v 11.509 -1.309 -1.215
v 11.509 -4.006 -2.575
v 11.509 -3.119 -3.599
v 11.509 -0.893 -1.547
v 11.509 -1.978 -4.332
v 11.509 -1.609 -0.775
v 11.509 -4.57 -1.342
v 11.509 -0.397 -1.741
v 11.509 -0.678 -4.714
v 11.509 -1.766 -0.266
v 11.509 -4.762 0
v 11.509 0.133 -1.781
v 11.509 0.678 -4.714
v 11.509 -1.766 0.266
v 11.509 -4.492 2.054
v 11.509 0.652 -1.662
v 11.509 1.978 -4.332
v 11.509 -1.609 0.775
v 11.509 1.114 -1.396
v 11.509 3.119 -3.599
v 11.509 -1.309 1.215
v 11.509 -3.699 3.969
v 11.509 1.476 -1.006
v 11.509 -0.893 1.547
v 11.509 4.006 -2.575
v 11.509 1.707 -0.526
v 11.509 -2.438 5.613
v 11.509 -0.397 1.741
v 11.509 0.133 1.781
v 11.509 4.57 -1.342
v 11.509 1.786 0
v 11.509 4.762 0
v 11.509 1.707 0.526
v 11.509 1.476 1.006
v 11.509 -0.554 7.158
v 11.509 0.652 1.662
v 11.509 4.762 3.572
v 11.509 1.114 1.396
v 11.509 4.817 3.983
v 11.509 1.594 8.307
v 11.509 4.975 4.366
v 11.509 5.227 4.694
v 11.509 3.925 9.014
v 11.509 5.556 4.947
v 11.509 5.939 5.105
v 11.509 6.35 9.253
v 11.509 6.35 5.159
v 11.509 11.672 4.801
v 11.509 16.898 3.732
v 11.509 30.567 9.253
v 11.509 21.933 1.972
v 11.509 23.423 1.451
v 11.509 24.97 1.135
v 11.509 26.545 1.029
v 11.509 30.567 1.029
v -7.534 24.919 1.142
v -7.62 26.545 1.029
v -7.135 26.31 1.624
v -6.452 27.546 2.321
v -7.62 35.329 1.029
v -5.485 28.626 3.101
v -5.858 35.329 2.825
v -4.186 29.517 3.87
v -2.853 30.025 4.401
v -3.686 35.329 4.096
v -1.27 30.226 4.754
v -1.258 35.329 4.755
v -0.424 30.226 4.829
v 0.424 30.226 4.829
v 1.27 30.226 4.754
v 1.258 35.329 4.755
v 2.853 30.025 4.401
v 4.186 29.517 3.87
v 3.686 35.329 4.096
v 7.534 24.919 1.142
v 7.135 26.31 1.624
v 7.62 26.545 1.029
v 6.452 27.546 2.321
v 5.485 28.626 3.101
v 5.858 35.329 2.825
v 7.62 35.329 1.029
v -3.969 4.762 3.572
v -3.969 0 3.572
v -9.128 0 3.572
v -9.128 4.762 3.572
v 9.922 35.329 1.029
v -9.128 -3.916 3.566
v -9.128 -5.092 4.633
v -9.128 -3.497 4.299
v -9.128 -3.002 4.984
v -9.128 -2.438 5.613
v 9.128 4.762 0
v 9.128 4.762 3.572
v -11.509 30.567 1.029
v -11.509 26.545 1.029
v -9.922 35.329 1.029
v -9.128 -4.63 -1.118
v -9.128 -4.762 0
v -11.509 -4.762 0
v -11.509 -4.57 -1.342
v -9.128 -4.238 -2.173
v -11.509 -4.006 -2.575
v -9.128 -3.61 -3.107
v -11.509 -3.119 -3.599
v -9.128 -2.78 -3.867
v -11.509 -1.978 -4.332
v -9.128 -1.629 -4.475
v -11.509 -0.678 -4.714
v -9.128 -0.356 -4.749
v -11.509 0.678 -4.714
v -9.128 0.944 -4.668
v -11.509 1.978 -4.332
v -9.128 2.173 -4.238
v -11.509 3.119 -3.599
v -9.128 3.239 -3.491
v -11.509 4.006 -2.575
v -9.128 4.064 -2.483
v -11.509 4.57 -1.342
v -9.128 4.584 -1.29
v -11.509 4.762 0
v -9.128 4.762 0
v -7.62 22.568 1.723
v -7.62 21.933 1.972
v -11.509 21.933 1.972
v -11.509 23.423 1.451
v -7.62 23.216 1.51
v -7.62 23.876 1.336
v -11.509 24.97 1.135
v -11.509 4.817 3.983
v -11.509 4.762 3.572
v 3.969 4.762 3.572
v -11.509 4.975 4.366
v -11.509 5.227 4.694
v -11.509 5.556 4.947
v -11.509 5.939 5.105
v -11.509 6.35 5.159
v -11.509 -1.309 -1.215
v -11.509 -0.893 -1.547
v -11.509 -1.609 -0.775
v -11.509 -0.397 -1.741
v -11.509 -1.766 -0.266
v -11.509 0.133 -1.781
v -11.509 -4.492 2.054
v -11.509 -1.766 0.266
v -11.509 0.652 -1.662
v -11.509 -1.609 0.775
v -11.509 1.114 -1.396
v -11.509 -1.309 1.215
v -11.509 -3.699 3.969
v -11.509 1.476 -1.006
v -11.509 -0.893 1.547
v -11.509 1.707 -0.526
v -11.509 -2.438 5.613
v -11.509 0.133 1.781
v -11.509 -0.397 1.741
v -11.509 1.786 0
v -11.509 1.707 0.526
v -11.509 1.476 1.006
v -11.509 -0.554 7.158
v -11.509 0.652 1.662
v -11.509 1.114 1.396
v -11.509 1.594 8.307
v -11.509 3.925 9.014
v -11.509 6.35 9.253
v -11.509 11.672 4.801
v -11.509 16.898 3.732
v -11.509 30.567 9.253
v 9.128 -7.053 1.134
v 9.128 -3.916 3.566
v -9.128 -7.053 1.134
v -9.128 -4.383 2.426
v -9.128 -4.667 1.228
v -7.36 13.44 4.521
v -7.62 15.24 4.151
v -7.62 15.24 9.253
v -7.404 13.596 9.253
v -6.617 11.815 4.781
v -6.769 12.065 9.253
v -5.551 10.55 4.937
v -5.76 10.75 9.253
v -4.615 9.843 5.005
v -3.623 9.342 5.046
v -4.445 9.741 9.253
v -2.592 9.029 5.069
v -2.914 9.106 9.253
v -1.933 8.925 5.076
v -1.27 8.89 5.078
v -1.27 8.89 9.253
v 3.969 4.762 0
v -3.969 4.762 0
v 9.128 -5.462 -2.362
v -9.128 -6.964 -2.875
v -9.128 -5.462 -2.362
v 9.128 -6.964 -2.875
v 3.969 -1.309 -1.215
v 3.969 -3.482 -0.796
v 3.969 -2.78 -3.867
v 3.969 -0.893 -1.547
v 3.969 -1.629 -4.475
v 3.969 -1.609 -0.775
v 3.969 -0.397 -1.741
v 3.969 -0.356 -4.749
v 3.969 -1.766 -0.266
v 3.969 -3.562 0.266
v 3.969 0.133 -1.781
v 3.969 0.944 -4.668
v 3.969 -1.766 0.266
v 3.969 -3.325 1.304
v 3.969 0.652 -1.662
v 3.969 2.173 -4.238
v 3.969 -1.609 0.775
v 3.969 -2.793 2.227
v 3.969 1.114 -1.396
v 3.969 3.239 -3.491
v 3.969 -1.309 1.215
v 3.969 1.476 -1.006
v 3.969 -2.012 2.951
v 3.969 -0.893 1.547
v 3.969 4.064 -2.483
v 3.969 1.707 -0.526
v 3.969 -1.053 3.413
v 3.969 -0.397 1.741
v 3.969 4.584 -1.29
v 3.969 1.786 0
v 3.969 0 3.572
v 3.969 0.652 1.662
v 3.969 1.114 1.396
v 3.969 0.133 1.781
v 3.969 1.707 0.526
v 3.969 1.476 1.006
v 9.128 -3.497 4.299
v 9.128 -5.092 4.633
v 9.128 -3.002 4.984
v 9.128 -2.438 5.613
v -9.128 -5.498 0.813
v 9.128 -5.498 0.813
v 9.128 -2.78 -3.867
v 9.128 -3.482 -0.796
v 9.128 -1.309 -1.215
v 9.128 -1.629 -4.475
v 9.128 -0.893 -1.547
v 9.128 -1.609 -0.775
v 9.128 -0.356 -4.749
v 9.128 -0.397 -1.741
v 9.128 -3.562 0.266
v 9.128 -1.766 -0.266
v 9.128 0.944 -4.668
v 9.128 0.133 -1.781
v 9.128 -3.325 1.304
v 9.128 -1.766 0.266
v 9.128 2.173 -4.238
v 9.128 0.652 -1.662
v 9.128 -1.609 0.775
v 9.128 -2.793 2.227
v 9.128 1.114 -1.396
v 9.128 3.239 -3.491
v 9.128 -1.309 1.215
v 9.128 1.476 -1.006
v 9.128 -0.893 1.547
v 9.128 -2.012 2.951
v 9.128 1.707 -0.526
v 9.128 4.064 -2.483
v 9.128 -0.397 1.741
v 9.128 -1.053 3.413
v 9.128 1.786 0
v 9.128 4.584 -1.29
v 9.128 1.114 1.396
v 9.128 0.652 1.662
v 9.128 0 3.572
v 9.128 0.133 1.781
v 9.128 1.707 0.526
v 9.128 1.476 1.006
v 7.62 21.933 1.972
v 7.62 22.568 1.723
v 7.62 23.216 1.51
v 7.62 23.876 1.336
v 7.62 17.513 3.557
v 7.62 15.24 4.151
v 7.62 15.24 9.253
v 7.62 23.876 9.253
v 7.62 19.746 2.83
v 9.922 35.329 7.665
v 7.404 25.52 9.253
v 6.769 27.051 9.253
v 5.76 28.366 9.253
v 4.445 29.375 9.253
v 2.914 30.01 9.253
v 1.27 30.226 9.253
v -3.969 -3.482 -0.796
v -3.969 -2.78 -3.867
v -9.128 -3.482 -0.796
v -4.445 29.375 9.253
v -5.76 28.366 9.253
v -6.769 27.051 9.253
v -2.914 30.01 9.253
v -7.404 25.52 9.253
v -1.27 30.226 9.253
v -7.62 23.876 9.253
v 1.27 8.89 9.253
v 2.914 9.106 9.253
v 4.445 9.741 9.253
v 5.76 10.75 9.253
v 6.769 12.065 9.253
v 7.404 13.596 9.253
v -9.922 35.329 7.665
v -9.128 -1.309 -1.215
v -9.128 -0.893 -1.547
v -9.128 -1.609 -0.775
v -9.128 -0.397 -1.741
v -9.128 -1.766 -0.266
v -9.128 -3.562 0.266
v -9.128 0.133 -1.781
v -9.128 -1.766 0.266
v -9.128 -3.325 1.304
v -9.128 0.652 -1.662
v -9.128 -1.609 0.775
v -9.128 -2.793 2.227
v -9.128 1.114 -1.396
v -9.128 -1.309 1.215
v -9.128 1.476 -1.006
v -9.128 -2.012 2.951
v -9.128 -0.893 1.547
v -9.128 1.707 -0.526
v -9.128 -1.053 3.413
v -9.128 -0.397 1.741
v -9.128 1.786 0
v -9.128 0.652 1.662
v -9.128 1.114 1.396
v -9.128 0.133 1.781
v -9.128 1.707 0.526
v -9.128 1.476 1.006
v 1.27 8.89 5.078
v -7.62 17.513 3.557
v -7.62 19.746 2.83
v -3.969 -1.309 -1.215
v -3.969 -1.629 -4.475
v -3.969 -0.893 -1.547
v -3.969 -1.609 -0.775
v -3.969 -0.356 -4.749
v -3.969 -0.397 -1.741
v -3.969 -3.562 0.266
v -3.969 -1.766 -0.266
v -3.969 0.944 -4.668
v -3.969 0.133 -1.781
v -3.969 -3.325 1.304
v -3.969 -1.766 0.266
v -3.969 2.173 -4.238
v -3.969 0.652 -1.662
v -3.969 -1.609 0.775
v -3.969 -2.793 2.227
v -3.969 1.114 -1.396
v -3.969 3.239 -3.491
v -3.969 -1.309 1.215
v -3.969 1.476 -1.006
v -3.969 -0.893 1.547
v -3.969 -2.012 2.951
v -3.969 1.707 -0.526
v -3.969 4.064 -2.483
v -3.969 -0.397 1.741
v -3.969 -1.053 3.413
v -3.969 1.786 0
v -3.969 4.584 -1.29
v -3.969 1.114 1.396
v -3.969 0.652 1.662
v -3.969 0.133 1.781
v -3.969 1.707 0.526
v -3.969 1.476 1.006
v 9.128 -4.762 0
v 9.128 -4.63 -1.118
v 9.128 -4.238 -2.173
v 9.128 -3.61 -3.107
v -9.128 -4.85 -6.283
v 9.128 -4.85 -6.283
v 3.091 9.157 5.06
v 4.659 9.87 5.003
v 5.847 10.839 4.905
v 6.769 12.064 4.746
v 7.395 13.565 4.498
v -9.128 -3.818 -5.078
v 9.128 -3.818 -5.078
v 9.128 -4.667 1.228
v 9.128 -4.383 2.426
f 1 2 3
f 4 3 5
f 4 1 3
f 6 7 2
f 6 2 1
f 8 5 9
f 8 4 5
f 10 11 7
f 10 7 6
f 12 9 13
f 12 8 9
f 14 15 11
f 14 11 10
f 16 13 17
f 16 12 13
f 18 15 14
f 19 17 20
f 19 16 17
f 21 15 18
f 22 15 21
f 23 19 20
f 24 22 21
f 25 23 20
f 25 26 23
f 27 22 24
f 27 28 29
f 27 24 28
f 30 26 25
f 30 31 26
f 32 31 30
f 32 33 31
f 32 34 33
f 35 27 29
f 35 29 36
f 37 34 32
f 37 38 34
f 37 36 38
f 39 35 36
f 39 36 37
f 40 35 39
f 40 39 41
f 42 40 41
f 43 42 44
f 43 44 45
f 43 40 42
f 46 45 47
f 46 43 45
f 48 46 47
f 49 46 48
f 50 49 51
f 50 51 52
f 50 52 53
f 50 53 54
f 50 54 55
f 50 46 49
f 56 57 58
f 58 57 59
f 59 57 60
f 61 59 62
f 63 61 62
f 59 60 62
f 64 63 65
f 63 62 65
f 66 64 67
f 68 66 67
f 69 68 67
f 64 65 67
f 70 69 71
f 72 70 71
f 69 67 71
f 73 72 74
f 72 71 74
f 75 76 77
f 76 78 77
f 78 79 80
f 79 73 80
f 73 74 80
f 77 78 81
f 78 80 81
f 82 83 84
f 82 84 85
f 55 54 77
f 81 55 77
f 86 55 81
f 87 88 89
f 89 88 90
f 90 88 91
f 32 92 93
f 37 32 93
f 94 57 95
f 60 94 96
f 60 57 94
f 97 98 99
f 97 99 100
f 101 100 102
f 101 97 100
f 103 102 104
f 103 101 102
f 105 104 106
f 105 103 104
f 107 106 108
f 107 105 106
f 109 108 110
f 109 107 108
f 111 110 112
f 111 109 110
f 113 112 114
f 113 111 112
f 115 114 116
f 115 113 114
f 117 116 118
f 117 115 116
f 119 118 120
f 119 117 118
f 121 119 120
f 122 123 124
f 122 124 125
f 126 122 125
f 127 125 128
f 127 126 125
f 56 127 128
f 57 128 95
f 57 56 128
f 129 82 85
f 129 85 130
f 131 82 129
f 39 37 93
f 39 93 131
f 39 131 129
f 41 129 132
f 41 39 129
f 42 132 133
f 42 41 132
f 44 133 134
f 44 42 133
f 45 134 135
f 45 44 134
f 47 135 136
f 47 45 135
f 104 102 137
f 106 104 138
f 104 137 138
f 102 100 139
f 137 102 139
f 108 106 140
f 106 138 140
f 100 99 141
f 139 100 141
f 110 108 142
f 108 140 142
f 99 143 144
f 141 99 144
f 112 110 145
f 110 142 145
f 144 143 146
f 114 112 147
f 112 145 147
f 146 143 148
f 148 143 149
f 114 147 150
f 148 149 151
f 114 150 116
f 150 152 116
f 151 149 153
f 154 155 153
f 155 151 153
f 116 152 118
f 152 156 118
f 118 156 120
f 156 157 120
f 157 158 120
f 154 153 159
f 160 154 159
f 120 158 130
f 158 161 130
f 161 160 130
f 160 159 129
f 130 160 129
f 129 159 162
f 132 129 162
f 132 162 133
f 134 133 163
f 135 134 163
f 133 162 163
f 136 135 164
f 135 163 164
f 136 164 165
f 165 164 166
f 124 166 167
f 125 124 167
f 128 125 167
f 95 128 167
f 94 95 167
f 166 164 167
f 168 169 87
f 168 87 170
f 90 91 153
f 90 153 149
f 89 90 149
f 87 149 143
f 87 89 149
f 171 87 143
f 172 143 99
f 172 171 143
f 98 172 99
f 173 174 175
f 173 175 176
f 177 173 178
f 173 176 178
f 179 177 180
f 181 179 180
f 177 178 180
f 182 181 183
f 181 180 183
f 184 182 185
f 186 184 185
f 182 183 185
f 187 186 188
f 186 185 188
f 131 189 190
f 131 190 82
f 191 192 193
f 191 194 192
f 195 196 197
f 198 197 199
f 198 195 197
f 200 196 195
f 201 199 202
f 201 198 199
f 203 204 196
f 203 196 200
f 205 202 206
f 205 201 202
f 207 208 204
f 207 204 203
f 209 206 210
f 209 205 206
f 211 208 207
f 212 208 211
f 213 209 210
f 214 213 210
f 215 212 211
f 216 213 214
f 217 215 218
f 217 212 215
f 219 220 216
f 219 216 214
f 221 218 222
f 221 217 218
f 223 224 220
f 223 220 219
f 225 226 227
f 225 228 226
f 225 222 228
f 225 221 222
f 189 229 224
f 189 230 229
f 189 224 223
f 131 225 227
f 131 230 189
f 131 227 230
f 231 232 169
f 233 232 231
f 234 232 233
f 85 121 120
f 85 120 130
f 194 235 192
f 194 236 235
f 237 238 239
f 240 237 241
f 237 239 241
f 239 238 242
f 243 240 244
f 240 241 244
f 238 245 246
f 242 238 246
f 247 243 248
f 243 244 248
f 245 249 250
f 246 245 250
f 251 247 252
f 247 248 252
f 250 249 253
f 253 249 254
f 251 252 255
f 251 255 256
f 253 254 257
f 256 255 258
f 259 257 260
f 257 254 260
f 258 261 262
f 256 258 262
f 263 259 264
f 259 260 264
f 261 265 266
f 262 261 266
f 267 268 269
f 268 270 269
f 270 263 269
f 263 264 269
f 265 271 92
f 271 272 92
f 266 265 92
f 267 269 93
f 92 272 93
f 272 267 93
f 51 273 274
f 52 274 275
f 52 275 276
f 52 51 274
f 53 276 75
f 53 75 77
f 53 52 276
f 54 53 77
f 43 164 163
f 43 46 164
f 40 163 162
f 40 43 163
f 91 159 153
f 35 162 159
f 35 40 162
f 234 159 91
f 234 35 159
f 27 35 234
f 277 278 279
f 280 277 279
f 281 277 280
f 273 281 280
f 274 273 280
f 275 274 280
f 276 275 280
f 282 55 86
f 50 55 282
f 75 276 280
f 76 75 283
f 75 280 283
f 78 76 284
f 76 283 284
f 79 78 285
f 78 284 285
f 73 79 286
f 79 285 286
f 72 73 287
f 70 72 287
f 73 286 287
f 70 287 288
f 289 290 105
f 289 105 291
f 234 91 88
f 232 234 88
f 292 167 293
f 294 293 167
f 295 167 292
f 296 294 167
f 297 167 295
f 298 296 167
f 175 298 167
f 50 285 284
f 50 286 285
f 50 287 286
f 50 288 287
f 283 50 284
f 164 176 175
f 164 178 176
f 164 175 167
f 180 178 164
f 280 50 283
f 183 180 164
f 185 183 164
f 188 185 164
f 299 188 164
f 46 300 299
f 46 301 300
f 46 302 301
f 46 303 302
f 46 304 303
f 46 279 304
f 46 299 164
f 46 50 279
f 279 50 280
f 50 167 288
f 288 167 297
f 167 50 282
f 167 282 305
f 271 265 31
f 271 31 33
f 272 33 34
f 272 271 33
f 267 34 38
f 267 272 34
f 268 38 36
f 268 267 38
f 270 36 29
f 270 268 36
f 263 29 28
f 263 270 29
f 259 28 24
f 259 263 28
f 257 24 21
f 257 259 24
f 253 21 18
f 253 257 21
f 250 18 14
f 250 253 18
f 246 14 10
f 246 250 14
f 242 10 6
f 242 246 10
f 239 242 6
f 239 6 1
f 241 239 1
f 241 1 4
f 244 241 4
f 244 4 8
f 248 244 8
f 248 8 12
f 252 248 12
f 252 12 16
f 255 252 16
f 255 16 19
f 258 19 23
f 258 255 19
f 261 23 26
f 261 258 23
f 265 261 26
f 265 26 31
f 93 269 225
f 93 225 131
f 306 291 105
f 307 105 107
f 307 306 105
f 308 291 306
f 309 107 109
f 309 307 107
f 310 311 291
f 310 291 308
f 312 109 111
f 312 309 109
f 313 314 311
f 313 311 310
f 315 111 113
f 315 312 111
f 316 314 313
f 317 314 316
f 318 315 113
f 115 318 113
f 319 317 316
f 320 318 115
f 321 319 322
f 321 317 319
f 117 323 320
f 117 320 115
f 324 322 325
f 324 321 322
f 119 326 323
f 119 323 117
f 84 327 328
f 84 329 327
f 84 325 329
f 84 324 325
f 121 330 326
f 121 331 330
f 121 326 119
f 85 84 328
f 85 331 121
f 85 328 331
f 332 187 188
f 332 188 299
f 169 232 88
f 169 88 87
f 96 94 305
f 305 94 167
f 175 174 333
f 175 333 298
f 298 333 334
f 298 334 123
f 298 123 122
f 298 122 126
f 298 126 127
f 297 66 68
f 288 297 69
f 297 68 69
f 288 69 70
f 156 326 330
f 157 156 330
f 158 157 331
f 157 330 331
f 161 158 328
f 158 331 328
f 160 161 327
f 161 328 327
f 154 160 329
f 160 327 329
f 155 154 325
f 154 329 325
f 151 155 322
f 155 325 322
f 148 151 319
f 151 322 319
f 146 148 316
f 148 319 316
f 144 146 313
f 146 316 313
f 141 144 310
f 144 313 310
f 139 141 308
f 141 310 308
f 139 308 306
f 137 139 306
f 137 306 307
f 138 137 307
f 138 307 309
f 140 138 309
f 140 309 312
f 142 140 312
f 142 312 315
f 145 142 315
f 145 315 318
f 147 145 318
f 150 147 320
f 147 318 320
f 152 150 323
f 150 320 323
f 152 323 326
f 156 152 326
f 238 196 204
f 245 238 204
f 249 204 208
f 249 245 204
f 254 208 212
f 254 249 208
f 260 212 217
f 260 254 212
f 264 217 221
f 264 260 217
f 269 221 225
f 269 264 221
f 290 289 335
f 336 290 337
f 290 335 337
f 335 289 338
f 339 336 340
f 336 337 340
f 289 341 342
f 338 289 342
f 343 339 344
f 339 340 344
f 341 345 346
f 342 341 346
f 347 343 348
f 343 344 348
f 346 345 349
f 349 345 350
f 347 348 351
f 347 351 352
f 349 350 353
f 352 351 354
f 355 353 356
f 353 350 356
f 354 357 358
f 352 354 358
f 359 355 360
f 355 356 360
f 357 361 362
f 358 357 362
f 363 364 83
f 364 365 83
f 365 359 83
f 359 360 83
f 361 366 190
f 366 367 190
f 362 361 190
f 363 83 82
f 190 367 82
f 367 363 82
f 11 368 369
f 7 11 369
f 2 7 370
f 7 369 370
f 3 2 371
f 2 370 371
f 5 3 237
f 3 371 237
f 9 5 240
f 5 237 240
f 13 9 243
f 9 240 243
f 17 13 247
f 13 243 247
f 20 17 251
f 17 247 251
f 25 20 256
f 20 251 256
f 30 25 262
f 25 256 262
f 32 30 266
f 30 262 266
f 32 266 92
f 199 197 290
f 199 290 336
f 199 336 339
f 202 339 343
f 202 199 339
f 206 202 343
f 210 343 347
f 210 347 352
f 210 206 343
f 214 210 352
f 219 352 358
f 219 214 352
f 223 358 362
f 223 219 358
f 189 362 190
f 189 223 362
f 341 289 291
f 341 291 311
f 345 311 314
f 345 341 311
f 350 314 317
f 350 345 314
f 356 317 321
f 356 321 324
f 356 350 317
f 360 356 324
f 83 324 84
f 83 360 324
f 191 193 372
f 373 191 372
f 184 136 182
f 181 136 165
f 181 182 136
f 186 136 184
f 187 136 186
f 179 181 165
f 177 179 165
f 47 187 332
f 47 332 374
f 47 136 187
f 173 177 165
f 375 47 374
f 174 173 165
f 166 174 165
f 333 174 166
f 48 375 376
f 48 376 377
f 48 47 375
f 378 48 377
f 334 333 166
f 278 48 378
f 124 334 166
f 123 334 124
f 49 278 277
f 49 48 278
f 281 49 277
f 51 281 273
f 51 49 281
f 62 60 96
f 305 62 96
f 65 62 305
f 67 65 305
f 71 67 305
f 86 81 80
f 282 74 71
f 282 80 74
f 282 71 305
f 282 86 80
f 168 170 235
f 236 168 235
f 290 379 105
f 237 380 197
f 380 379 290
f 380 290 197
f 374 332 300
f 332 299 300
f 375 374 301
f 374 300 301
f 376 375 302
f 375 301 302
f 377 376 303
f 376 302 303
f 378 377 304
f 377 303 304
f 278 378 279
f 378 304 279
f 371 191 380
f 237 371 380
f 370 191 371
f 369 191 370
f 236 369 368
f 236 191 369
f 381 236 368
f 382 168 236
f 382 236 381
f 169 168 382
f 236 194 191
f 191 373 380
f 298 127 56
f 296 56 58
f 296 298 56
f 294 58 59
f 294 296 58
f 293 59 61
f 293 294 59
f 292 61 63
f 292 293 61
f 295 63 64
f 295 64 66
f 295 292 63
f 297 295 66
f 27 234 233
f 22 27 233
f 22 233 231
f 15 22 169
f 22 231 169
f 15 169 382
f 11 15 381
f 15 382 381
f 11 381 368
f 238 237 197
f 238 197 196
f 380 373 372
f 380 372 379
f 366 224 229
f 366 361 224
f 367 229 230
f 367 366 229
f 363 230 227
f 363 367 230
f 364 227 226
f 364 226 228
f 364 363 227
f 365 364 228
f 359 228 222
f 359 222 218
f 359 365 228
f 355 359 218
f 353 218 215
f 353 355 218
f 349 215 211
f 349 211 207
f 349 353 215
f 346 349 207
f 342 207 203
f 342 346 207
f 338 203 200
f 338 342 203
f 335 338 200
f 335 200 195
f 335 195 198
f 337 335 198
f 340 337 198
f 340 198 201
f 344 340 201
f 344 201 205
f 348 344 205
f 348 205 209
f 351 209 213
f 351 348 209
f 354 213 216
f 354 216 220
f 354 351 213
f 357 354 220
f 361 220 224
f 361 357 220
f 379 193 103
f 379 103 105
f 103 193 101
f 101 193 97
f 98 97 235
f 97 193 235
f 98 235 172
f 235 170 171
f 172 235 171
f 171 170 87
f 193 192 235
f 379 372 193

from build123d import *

# Parameters (mm, degrees)
F1_R      = 1.7859375
F2_DEPTH  = 3.96875
F3_DEPTH  = 9.128125
F4_START  = 9.128125
F0_R      = 1.7859375
F4_DEPTH  = 2.38125
F7_DEPTH  = 11.509375
F6_W      = 15.24
F6_H      = 21.336
F8_DEPTH  = 9.2536280605
F9_R      = 6.35
F11_DEPTH = 10.4116969269
F12_SIZE2 = 4.7625
F12_SIZE  = 1.5875


# Not quite as in the source:
# - a feature names something its author has since deleted; it is built from what else it names


with BuildPart() as f2:
    # F1 (on Right) → F2 (new body, symmetric)
    with BuildSketch(Plane.YZ):
        with BuildLine():
            Line((-3.4820551441, -0.7959792641), (-2.7800674169, -3.8668632517))
            ThreePointArc((-2.7800674169, -3.8668632517), (2.1727097341, -4.2380111682), (4.7625, 0))
            Line((4.7625, 0), (4.7625, 3.571875))
            Line((4.7625, 3.571875), (0, 3.571875))
            ThreePointArc((0, 3.571875), (-2.7929759621, 2.2265615399), (-3.4820551441, -0.7959792641))
        make_face()
        Circle(F1_R, mode=Mode.SUBTRACT)
    extrude(amount=F2_DEPTH, both=True)

    # F1 (on Right) → F3 (join, symmetric)
    with BuildSketch(Plane.YZ):
        with BuildLine():
            Line((-6.9643447844, -2.8750519268), (-5.4621269675, -2.3617314805))
            Line((-5.4621269675, -2.3617314805), (-4.8504655451, -6.2830637627))
            Line((-4.8504655451, -6.2830637627), (-3.8175156986, -5.077588394))
            Line((-3.8175156986, -5.077588394), (-2.7800674169, -3.8668632517))
            Line((-2.7800674169, -3.8668632517), (-3.4820551441, -0.7959792641))
            ThreePointArc((-3.4820551441, -0.7959792641), (-2.7929759621, 2.2265615399), (0, 3.571875))
            Line((0, 3.571875), (4.7625, 3.571875))
            ThreePointArc((4.7625, 3.571875), (5.2274679849, 4.6944070151), (6.35, 5.159375))
            Line((6.35, 5.159375), (6.35, 9.2526280605))
            ThreePointArc((6.35, 9.2526280605), (1.5941526376, 8.3066312028), (-2.4376600757, 5.6126600757))
            Line((-2.4376600757, 5.6126600757), (-5.0921494321, 4.6325641503))
            Line((-5.0921494321, 4.6325641503), (-3.9164474257, 3.5658490795))
            Line((-3.9164474257, 3.5658490795), (-7.0531168828, 1.134330772))
            Line((-7.0531168828, 1.134330772), (-5.4984652486, 0.8130605645))
            Line((-5.4984652486, 0.8130605645), (-6.9643447844, -2.8750519268))
        make_face()
    extrude(amount=F3_DEPTH, both=True)

    # F0 (on Right) → F4 (join)
    with BuildSketch(Plane.YZ.offset(F4_START)):
        with BuildLine():
            ThreePointArc((-2.4376600757, 5.6126600757), (-4.1582937893, 3.0375497444), (-4.7625, 0))
            ThreePointArc((-4.7625, 0), (0, -4.7625), (4.7625, 0))
            Line((4.7625, 0), (4.7625, 3.571875))
            ThreePointArc((4.7625, 3.571875), (5.2274679849, 4.6944070151), (6.35, 5.159375))
            Line((6.35, 5.159375), (6.35, 9.2526280605))
            ThreePointArc((6.35, 9.2526280605), (1.5941526376, 8.3066312028), (-2.4376600757, 5.6126600757))
        make_face()
        Circle(F0_R, mode=Mode.SUBTRACT)
    extrude(amount=F4_DEPTH)


with BuildPart() as f5_1:
    # F5: instance of F2
    add(f2.part.mirror(Plane.YZ))


with BuildPart() as f2_1:
    add(f2.part)

    add(f5_1.part)  # F7 merges F5_1
    # F0 (on Right) → F7 (join, symmetric)
    with BuildSketch(Plane.YZ):
        with BuildLine():
            Line((35.3293530643, 9.2526280605), (6.35, 9.2526280605))
            Line((6.35, 9.2526280605), (6.35, 5.159375))
            ThreePointArc((6.35, 5.159375), (14.3027763595, 4.3544032669), (21.9329443326, 1.9721421521))
            ThreePointArc((21.9329443326, 1.9721421521), (24.1912770347, 1.2670543743), (26.5450934892, 1.0288035264))
            Line((26.5450934892, 1.0288035264), (35.3293530643, 1.0288035264))
            Line((35.3293530643, 1.0288035264), (35.3293530643, 9.2526280605))
        make_face()
    extrude(amount=F7_DEPTH, both=True)

    # F6 (on Top) → F8 (cut, through all)
    with BuildSketch(Plane.XY):
        with Locations((0, 19.558)):
            Rectangle(F6_W, F6_H)
    extrude(amount=F8_DEPTH, mode=Mode.SUBTRACT)

    # F9
    f9_edges = [f2_1.edges().sort_by_distance(p)[0] for p in [
        (-7.62, 30.226, 5.140716),
        (7.62, 30.226, 5.140716),
        (7.62, 8.89, 7.16532),
        (-7.62, 8.89, 7.16532),
    ]]
    fillet(f9_edges, radius=F9_R)

    # F10 (on face) → F11 (cut, through all)
    with BuildSketch(Plane(origin=(0, 35.3293530643, 0), x_dir=(-1, 0, 0), z_dir=(0, 1, 0))):
        with BuildLine():
            Line((-7.62, 1.0288035264), (7.62, 1.0288035264))
            ThreePointArc((7.62, 1.0288035264), (0, 4.8388035264), (-7.62, 1.0288035264))
        make_face()
    extrude(amount=-F11_DEPTH, mode=Mode.SUBTRACT)

    # F12
    f12_edges = [f2_1.edges().sort_by_distance(p)[0] for p in [
        (11.509375, 35.329353, 5.140716),
        (-11.509375, 35.329353, 5.140716),
        (0, 35.329353, 9.252628),
    ]]
    f12_side = f2_1.faces().sort_by_distance((0, 35.329353, 5.838802))[0]
    chamfer(f12_edges, length=F12_SIZE, length2=F12_SIZE2, reference=f12_side)


solid = f2_1.part
